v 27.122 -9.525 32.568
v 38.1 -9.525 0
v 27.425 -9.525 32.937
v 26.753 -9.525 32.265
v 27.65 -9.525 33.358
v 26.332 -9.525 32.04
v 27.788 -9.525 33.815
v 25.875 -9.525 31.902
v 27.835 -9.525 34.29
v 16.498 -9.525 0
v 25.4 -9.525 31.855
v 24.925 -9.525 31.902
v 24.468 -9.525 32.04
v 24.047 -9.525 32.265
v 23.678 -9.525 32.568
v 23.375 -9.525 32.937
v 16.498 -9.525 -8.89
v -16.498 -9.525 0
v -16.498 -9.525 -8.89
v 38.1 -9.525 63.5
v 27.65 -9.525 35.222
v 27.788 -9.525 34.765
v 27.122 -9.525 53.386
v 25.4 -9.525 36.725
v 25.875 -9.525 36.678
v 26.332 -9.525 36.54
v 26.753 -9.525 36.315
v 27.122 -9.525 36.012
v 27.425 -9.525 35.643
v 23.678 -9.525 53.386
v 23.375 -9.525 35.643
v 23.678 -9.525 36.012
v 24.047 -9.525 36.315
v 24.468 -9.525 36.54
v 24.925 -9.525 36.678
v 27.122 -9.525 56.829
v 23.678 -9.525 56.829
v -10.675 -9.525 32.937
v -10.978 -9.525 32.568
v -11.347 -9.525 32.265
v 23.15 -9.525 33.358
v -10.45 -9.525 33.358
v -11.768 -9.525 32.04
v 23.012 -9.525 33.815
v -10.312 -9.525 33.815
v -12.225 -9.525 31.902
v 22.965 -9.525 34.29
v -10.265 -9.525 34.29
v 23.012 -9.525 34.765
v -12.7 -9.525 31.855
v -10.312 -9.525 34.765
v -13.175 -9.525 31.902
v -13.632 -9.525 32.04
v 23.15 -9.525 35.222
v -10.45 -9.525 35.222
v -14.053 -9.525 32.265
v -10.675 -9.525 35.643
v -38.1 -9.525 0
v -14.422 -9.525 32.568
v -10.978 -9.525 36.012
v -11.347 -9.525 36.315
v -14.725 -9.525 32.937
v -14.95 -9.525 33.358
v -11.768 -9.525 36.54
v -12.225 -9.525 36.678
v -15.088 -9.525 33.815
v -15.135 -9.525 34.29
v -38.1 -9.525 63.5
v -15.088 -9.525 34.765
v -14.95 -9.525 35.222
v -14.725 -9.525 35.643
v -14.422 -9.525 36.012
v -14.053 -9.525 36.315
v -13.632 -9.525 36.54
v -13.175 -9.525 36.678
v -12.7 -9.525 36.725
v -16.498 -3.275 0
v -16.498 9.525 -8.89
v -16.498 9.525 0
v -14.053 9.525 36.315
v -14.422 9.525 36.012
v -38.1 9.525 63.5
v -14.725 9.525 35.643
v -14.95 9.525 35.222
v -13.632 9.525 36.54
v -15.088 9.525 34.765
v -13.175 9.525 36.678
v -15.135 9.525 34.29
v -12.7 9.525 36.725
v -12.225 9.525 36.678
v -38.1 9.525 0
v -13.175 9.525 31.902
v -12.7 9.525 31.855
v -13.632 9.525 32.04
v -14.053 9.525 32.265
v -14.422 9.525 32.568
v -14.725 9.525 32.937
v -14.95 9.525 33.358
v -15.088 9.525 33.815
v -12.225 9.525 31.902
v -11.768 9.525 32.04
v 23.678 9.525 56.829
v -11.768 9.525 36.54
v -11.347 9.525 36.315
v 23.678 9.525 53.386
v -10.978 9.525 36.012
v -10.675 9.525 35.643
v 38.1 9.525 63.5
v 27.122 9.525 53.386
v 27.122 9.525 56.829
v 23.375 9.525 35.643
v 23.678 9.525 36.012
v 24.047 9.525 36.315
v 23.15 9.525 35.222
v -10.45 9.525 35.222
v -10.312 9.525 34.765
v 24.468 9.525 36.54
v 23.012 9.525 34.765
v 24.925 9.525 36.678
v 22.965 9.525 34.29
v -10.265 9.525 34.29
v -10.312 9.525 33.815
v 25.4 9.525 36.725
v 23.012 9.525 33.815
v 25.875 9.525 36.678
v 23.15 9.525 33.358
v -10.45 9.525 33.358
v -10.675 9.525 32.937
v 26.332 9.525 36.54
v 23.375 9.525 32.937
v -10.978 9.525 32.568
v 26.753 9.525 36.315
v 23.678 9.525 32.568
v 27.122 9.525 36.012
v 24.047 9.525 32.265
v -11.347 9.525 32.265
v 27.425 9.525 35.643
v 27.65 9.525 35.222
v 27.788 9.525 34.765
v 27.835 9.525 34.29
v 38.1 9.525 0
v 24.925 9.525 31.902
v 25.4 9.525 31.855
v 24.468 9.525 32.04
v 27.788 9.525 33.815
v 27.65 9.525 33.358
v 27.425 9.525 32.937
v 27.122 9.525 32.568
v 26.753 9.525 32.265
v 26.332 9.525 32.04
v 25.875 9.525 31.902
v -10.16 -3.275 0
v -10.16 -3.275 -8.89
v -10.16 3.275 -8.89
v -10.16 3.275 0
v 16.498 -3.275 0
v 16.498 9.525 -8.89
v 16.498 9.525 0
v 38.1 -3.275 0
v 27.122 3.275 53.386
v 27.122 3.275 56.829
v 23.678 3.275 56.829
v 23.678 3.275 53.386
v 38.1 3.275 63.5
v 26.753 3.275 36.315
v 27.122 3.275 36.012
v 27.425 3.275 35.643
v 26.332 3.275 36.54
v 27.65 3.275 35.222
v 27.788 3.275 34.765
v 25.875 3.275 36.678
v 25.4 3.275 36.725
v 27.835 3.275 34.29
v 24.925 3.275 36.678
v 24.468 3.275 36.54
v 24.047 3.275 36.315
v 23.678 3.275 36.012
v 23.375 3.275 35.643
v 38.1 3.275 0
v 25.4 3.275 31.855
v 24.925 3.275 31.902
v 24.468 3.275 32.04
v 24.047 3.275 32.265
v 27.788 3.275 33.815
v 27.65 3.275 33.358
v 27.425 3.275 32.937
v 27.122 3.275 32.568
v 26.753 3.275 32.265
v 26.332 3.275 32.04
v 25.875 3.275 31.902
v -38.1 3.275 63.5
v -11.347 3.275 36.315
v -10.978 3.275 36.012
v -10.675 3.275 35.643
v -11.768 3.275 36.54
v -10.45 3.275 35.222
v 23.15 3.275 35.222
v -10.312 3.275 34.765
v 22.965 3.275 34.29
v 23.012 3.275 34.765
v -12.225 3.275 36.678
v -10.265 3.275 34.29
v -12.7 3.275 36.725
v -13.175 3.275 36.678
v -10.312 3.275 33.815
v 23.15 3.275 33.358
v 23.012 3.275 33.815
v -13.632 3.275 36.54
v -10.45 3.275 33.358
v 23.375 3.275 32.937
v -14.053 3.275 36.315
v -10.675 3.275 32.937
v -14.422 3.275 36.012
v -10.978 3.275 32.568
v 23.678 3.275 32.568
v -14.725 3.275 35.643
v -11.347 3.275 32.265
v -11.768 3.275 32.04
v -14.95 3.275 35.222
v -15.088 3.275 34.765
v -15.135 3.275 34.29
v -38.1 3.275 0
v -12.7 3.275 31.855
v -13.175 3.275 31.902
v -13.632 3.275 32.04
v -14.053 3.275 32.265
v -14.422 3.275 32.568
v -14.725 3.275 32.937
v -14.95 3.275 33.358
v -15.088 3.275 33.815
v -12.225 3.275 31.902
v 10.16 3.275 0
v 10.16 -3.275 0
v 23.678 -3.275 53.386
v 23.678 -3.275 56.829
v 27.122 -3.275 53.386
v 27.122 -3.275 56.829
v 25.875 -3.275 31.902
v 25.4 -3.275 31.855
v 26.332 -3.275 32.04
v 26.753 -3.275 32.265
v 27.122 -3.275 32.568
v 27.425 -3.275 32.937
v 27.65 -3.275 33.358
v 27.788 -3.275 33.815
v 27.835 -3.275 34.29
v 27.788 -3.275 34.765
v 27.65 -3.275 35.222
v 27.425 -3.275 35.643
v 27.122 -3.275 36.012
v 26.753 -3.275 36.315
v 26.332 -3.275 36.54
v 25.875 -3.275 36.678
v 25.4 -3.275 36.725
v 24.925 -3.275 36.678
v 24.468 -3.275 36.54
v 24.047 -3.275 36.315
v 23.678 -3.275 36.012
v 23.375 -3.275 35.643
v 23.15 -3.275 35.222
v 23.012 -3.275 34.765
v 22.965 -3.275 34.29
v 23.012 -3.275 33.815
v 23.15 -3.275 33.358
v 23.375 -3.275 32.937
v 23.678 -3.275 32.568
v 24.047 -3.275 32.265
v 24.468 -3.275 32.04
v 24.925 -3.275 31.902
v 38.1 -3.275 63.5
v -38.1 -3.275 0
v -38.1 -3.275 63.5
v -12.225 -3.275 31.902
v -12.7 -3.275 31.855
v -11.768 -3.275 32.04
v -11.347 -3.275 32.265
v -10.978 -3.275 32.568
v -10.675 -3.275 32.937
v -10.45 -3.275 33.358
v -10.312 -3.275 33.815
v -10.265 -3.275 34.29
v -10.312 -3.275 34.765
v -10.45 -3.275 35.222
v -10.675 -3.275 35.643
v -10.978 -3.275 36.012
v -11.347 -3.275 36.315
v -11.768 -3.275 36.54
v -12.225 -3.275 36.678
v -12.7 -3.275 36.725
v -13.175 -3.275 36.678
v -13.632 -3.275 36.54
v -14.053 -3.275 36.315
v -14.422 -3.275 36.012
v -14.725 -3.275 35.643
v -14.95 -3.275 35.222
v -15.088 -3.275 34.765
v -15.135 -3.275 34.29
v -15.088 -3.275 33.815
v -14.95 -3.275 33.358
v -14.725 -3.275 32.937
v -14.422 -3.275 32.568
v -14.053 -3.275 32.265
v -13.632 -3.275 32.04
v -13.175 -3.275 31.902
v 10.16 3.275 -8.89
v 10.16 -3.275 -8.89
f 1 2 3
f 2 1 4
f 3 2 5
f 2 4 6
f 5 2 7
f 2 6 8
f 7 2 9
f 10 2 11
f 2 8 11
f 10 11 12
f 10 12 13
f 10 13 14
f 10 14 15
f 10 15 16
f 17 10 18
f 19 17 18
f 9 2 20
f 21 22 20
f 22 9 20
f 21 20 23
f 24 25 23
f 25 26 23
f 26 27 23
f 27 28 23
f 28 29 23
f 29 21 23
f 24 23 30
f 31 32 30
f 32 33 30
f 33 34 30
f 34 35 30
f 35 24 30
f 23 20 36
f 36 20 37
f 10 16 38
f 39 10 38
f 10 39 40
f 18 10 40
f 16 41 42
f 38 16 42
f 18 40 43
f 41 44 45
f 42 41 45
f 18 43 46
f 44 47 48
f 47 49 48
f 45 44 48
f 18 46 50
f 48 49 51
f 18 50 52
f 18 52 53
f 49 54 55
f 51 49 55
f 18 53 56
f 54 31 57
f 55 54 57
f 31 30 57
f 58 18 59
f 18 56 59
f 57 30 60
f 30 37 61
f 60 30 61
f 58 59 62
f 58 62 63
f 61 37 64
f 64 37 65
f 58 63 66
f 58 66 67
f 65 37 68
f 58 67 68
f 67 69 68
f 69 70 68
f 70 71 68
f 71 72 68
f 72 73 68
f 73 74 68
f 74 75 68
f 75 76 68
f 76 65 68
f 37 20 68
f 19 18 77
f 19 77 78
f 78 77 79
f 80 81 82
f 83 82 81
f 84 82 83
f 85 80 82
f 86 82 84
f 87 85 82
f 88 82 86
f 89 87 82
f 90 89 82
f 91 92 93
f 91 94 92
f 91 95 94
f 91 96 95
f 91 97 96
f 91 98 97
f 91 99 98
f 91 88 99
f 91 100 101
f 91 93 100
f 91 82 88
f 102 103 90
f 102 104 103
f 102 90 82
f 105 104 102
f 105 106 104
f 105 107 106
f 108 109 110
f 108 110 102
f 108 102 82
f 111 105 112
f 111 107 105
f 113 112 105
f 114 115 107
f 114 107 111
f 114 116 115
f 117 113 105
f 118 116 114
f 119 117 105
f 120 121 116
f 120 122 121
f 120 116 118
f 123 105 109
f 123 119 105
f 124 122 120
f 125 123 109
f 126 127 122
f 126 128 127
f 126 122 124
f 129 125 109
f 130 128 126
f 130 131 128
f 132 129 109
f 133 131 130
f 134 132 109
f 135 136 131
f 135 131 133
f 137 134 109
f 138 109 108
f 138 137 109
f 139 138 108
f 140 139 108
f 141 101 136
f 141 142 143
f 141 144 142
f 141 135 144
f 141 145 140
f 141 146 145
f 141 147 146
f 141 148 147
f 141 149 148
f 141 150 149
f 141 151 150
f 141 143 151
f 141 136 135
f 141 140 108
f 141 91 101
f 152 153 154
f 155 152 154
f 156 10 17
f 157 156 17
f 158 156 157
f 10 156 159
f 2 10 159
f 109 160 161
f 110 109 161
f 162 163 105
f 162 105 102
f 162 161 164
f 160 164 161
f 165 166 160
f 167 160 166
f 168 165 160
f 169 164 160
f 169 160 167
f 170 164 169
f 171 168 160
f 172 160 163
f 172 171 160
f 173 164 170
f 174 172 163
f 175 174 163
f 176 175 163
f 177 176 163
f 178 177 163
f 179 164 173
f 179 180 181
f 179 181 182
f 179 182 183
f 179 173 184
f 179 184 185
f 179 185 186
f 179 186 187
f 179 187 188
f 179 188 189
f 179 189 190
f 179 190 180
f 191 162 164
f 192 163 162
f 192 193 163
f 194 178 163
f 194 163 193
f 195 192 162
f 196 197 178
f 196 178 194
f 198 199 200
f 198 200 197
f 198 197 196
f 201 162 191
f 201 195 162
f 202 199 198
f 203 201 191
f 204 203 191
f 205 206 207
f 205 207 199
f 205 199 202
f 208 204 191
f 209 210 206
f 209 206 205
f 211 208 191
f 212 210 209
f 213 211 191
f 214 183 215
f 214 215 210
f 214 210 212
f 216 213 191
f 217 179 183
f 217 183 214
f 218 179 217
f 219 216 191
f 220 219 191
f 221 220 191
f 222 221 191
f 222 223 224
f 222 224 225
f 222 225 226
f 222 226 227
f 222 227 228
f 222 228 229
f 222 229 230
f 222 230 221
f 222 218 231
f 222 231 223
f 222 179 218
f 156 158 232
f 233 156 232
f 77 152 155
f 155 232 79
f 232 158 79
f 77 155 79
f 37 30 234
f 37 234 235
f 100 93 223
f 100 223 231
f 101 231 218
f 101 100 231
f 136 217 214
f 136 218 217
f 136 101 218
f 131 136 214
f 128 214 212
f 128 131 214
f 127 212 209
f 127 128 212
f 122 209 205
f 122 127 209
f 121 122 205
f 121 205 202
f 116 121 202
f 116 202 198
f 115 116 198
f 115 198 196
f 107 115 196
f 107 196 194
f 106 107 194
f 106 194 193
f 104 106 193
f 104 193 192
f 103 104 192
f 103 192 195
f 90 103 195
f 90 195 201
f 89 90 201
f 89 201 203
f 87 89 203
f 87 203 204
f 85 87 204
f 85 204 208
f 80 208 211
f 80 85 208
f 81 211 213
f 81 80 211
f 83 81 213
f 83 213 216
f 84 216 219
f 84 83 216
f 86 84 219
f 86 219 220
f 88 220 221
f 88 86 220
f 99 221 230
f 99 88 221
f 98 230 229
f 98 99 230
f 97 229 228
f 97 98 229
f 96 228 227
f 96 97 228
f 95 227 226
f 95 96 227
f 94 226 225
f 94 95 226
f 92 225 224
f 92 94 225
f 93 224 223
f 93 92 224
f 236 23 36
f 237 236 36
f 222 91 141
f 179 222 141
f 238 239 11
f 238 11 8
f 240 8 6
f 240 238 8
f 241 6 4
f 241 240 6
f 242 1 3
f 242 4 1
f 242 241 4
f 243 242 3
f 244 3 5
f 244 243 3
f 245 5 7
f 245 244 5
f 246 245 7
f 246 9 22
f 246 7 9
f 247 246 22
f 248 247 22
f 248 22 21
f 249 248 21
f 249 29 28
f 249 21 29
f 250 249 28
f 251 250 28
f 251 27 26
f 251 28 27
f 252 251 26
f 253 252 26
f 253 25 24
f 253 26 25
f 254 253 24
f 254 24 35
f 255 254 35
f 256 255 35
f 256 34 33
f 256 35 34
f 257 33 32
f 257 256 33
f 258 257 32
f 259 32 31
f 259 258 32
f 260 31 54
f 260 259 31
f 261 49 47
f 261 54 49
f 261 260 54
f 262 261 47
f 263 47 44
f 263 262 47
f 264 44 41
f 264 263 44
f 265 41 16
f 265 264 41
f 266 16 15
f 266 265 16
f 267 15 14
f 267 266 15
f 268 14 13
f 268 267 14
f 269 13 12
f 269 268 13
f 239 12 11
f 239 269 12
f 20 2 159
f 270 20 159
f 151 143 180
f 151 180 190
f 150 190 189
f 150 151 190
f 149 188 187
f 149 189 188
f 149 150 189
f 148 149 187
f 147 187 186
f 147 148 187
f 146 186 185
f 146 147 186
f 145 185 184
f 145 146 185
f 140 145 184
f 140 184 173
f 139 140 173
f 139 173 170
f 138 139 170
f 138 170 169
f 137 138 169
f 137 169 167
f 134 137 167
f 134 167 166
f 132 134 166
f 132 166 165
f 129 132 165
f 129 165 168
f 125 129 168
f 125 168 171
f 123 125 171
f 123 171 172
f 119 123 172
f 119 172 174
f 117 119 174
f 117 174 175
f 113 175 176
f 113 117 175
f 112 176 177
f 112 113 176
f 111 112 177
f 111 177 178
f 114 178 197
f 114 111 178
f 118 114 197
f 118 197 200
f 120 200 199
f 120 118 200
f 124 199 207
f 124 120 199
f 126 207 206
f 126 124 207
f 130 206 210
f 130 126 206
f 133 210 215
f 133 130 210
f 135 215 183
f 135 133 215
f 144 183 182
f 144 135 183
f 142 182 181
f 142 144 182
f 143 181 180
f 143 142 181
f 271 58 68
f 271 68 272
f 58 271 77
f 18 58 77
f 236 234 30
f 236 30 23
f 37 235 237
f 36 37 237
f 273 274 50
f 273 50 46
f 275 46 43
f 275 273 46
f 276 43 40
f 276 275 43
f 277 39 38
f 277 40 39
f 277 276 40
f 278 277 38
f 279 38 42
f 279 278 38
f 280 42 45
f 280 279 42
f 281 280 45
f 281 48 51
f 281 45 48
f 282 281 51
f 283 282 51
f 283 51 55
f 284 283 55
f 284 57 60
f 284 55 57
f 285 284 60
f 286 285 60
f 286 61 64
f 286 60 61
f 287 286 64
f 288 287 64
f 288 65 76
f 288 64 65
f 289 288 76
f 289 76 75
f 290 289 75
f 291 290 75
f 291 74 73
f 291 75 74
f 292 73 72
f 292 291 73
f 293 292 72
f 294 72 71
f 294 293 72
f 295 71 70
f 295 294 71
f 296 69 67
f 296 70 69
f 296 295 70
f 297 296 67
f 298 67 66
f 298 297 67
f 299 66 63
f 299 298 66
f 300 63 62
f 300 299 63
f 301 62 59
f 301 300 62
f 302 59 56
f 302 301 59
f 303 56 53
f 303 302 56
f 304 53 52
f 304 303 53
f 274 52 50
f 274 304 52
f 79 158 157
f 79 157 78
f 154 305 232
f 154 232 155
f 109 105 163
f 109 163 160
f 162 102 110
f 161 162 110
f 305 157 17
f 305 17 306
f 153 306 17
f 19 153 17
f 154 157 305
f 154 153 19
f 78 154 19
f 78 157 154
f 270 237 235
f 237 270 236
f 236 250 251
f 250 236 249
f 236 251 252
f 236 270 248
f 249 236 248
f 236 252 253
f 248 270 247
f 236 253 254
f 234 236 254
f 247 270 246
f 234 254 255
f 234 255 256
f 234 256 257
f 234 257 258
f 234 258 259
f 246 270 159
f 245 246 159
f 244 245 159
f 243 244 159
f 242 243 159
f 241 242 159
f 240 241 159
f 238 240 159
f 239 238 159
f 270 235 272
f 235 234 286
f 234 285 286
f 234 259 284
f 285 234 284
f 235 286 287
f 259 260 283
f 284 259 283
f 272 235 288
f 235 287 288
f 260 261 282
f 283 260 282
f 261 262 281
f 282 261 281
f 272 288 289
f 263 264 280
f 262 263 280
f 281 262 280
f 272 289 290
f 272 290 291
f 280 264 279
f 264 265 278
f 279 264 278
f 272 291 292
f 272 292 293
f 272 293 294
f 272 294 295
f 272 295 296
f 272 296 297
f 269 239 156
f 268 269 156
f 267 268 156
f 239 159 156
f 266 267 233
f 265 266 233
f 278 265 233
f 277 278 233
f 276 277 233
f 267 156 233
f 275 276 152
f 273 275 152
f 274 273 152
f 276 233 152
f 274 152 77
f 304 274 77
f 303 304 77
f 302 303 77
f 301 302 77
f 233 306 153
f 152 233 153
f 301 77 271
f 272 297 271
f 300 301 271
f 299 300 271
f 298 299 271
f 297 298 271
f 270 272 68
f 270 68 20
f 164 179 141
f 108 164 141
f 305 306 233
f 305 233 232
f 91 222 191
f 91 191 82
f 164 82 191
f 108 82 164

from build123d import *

# Parameters (mm, degrees)
SKETCH1_W               = 76.2
SKETCH1_H               = 19.05
BOSS_EXTRUDE1_DEPTH     = 63.5
SKETCH2_W               = 76.2
SKETCH2_H               = 6.550000108
CUT_EXTRUDE1_DEPTH      = 69.85
SKETCH4_W               = 32.995567884
SKETCH4_H               = 19.05
BOSS_EXTRUDE2_DEPTH     = 8.89
SKETCH6_W               = 20.32
SKETCH6_H               = 6.550000108
CUT_EXTRUDE4_DEPTH      = 12.7
CUT_EXTRUDE5_DEPTH      = 77.464125575
CUT_EXTRUDE5_DEPTH_BACK = 77.464125575
SKETCH3_R               = 2.434895054
SKETCH3_W               = 3.443461608
SKETCH3_H               = 3.443461609


with BuildPart() as part:
    # Sketch1 → Boss-Extrude1 (new body)
    with BuildSketch(Plane.XY):
        Rectangle(SKETCH1_W, SKETCH1_H)
    extrude(amount=BOSS_EXTRUDE1_DEPTH)

    # Sketch2 → Cut-Extrude1 (cut)
    with BuildSketch(Plane(origin=(0, 0, 0), x_dir=(-1, 0, 0), z_dir=(0, 0, -1))):
        Rectangle(SKETCH2_W, SKETCH2_H)
    extrude(amount=-CUT_EXTRUDE1_DEPTH, mode=Mode.SUBTRACT)


with BuildPart() as cut_extrude1_piece_1:
    # of the separate pieces the step leaves, piece 1, a body of its own (cut_extrude1_pieces)
    add(part.part.solids().sort_by_distance((-38.1, 9.525, 0))[0])


with BuildPart() as cut_extrude1_piece_2:
    # of the separate pieces the step leaves, piece 2, a body of its own (cut_extrude1_pieces)
    add(part.part.solids().sort_by_distance((-38.1, -9.525, 0))[0])

    # Sketch4 → Boss-Extrude2 (add)
    with BuildSketch(Plane(origin=(0, 0, 0), x_dir=(-1, 0, 0), z_dir=(0, 0, -1))):
        Rectangle(SKETCH4_W, SKETCH4_H)
    extrude(amount=BOSS_EXTRUDE2_DEPTH)

    # Sketch6 → Cut-Extrude4 (cut)
    with BuildSketch(Plane(origin=(0, 0, -8.89), x_dir=(-1, 0, 0), z_dir=(0, 0, -1))):
        Rectangle(SKETCH6_W, SKETCH6_H)
    extrude(amount=-CUT_EXTRUDE4_DEPTH, mode=Mode.SUBTRACT)


with BuildPart() as cut_extrude5_tool:
    # Sketch3 → Cut-Extrude5 (new, two sides: drawn at the far end of the back side and taken through both)
    with BuildSketch(Plane.XZ.offset(9.525).offset(-CUT_EXTRUDE5_DEPTH_BACK)):
        with Locations(Location((25.4, 34.29, 0), (0, 0, 270))):
            Circle(SKETCH3_R)
        with Locations(Location((-12.7, 34.29, 0), (0, 0, 270))):
            Circle(SKETCH3_R)
        with Locations((25.4, 55.107720771)):
            Rectangle(SKETCH3_W, SKETCH3_H)
    extrude(amount=CUT_EXTRUDE5_DEPTH + CUT_EXTRUDE5_DEPTH_BACK)


with BuildPart() as cut_extrude1_piece_1_1:
    add(cut_extrude1_piece_1.part)

    # Cut-Extrude5: cut by cut_extrude5_tool
    add(cut_extrude5_tool.part, mode=Mode.SUBTRACT)


with BuildPart() as cut_extrude1_piece_2_1:
    add(cut_extrude1_piece_2.part)

    # Cut-Extrude5: cut by cut_extrude5_tool
    add(cut_extrude5_tool.part, mode=Mode.SUBTRACT)


solid = Compound([cut_extrude1_piece_1_1.part, cut_extrude1_piece_2_1.part])
